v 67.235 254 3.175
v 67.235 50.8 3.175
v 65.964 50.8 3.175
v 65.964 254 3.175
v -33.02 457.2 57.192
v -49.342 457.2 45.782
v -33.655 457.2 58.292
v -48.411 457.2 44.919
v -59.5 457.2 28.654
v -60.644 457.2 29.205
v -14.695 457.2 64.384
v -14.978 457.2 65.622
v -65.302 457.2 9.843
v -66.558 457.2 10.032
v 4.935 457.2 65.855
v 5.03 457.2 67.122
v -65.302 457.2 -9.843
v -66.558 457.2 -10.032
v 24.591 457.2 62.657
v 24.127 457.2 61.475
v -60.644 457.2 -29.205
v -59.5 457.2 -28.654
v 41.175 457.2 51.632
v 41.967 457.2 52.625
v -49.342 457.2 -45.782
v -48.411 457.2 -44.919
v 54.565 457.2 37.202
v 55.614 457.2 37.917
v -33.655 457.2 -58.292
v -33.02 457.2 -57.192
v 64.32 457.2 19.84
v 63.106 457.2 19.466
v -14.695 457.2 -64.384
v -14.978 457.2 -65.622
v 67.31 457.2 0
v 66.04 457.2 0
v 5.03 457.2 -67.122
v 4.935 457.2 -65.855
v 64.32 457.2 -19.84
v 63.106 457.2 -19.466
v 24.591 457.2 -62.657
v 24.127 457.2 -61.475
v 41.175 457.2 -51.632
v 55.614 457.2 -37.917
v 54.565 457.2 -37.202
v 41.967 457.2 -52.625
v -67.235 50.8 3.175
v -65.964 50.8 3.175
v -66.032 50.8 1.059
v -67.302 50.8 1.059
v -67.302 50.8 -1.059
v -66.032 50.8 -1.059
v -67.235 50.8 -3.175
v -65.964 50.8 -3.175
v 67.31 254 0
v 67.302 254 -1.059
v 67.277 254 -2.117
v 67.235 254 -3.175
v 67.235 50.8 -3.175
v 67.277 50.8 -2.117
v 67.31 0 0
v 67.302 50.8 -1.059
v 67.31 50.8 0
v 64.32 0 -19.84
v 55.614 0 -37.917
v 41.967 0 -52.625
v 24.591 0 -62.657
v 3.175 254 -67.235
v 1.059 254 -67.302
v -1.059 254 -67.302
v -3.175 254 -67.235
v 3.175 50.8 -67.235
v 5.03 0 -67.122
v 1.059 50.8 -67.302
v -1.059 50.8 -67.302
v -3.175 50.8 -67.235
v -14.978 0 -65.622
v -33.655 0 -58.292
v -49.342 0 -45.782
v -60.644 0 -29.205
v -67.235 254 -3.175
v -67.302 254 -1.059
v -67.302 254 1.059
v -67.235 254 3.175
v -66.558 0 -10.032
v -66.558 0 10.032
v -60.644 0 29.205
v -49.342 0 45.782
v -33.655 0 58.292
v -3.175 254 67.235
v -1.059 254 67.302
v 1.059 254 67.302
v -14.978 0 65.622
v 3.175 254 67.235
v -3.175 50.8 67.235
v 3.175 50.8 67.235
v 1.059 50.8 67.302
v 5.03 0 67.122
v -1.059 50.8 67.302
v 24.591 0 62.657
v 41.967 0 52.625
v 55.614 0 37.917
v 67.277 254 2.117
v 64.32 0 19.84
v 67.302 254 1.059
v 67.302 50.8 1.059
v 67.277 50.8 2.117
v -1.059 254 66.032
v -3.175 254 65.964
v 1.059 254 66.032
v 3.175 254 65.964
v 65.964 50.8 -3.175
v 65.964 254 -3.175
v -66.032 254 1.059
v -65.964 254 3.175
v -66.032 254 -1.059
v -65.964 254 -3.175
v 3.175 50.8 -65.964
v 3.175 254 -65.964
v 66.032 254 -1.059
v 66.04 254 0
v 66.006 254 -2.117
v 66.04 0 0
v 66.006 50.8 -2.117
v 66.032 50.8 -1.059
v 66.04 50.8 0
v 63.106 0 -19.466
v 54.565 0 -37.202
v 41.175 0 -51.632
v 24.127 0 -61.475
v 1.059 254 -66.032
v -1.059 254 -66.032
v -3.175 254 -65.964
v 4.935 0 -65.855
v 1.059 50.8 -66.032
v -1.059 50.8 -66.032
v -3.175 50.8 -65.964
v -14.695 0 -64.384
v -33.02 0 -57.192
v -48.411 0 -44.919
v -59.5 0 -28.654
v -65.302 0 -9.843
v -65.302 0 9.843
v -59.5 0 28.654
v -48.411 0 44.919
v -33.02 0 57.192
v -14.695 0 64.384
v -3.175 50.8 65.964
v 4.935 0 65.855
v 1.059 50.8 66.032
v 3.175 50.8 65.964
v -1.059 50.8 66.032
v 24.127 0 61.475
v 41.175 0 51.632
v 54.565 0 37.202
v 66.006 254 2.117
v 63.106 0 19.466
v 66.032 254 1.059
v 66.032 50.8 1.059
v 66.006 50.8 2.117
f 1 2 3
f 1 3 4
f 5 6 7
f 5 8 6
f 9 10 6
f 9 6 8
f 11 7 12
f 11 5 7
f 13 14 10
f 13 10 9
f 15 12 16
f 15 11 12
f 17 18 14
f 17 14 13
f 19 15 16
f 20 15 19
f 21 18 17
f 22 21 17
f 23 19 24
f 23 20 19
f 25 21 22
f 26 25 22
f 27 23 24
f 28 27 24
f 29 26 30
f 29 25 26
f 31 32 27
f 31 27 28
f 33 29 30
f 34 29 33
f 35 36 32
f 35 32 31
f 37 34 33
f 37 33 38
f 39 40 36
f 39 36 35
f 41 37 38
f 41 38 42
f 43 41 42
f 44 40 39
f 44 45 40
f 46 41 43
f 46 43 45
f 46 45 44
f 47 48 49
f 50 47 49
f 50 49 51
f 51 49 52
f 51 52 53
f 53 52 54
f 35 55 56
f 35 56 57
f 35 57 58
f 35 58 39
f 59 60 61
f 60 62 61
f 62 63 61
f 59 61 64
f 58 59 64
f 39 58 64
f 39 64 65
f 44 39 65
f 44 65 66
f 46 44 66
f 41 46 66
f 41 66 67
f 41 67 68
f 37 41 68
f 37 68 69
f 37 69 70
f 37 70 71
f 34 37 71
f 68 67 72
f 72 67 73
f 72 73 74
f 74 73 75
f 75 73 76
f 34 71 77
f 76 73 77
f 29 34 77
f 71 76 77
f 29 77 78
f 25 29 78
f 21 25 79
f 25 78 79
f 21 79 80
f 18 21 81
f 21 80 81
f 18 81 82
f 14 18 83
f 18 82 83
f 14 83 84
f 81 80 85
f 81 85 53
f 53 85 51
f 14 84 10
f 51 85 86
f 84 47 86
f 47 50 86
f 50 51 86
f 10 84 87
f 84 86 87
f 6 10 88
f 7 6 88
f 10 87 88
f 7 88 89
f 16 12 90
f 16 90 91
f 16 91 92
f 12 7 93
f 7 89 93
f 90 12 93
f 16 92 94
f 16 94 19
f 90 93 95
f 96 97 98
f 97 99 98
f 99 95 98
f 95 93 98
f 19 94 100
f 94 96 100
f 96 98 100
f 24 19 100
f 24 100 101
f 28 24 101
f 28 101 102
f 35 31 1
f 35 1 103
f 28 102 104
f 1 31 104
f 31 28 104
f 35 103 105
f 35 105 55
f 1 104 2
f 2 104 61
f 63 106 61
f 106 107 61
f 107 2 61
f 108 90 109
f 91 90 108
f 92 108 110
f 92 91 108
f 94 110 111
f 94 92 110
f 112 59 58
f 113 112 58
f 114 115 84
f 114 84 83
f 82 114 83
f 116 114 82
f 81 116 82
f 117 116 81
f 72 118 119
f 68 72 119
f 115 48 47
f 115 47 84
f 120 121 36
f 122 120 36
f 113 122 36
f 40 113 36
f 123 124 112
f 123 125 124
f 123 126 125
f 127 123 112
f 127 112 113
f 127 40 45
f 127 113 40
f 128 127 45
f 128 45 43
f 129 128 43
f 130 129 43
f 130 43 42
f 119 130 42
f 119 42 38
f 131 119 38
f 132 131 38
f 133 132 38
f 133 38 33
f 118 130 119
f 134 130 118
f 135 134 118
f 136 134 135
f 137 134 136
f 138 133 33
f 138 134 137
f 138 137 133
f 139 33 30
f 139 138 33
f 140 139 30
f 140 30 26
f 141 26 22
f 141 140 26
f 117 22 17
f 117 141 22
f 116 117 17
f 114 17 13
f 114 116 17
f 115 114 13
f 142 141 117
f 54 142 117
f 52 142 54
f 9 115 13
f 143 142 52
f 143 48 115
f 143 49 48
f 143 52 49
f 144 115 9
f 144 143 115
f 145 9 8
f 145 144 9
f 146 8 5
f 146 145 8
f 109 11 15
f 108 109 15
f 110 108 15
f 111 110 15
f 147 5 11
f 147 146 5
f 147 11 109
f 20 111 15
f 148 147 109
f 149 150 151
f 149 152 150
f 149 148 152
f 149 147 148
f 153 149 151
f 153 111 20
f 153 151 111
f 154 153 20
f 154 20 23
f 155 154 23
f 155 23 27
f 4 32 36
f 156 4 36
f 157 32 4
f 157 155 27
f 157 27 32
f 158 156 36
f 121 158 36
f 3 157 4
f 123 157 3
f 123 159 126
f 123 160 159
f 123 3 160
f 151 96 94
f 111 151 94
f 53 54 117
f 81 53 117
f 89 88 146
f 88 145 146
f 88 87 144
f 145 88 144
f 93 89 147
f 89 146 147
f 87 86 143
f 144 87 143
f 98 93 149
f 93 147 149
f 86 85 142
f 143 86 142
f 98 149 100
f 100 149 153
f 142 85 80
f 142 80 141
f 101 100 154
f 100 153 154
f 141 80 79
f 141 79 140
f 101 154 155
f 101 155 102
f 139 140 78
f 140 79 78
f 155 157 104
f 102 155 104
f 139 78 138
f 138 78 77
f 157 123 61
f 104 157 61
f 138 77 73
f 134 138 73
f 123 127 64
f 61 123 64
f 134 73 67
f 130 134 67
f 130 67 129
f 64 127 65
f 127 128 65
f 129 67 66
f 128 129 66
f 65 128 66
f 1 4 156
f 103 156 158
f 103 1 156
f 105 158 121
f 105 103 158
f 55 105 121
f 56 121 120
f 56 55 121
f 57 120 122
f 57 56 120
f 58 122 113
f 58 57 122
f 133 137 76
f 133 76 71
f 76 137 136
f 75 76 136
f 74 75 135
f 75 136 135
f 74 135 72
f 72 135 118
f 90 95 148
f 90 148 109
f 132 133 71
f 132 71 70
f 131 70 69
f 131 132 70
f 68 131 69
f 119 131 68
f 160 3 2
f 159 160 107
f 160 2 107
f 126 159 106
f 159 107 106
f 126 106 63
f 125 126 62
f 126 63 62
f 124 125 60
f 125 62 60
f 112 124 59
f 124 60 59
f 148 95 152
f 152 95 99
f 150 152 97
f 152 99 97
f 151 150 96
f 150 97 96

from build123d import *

# Parameters (mm, degrees)
SKETCH1_R           = 67.31
SKETCH1_R_2         = 66.04
BOSS_EXTRUDE1_DEPTH = 457.2
SKETCH3_W           = 6.35
SKETCH3_H           = 203.2
CUT_EXTRUDE1_DEPTH  = 68.31
CIRPATTERN1_COUNT   = 4


with BuildPart() as part:
    # Sketch1 → Boss-Extrude1 (new body)
    with BuildSketch(Plane(origin=(0, 0, 0), x_dir=(1, 0, 0), z_dir=(0, 1, 0))):
        Circle(SKETCH1_R)
        Circle(SKETCH1_R_2, mode=Mode.SUBTRACT)
    extrude(amount=BOSS_EXTRUDE1_DEPTH)

    # Sketch3 → Cut-Extrude1 (cut, symmetric)
    with BuildSketch(Plane.XY):
        with Locations((0, 152.4)):
            Rectangle(SKETCH3_W, SKETCH3_H)
    cut_extrude1 = extrude(amount=CUT_EXTRUDE1_DEPTH, both=True, mode=Mode.SUBTRACT)

    # CirPattern1: Cut-Extrude1 ×4 about axis
    cirpattern1_axis = Axis((0, 0, 0), (0, 1, 0))
    for i in range(1, CIRPATTERN1_COUNT):
        add(cut_extrude1.rotate(cirpattern1_axis, i * 360 / CIRPATTERN1_COUNT), mode=Mode.SUBTRACT)


solid = part.part
